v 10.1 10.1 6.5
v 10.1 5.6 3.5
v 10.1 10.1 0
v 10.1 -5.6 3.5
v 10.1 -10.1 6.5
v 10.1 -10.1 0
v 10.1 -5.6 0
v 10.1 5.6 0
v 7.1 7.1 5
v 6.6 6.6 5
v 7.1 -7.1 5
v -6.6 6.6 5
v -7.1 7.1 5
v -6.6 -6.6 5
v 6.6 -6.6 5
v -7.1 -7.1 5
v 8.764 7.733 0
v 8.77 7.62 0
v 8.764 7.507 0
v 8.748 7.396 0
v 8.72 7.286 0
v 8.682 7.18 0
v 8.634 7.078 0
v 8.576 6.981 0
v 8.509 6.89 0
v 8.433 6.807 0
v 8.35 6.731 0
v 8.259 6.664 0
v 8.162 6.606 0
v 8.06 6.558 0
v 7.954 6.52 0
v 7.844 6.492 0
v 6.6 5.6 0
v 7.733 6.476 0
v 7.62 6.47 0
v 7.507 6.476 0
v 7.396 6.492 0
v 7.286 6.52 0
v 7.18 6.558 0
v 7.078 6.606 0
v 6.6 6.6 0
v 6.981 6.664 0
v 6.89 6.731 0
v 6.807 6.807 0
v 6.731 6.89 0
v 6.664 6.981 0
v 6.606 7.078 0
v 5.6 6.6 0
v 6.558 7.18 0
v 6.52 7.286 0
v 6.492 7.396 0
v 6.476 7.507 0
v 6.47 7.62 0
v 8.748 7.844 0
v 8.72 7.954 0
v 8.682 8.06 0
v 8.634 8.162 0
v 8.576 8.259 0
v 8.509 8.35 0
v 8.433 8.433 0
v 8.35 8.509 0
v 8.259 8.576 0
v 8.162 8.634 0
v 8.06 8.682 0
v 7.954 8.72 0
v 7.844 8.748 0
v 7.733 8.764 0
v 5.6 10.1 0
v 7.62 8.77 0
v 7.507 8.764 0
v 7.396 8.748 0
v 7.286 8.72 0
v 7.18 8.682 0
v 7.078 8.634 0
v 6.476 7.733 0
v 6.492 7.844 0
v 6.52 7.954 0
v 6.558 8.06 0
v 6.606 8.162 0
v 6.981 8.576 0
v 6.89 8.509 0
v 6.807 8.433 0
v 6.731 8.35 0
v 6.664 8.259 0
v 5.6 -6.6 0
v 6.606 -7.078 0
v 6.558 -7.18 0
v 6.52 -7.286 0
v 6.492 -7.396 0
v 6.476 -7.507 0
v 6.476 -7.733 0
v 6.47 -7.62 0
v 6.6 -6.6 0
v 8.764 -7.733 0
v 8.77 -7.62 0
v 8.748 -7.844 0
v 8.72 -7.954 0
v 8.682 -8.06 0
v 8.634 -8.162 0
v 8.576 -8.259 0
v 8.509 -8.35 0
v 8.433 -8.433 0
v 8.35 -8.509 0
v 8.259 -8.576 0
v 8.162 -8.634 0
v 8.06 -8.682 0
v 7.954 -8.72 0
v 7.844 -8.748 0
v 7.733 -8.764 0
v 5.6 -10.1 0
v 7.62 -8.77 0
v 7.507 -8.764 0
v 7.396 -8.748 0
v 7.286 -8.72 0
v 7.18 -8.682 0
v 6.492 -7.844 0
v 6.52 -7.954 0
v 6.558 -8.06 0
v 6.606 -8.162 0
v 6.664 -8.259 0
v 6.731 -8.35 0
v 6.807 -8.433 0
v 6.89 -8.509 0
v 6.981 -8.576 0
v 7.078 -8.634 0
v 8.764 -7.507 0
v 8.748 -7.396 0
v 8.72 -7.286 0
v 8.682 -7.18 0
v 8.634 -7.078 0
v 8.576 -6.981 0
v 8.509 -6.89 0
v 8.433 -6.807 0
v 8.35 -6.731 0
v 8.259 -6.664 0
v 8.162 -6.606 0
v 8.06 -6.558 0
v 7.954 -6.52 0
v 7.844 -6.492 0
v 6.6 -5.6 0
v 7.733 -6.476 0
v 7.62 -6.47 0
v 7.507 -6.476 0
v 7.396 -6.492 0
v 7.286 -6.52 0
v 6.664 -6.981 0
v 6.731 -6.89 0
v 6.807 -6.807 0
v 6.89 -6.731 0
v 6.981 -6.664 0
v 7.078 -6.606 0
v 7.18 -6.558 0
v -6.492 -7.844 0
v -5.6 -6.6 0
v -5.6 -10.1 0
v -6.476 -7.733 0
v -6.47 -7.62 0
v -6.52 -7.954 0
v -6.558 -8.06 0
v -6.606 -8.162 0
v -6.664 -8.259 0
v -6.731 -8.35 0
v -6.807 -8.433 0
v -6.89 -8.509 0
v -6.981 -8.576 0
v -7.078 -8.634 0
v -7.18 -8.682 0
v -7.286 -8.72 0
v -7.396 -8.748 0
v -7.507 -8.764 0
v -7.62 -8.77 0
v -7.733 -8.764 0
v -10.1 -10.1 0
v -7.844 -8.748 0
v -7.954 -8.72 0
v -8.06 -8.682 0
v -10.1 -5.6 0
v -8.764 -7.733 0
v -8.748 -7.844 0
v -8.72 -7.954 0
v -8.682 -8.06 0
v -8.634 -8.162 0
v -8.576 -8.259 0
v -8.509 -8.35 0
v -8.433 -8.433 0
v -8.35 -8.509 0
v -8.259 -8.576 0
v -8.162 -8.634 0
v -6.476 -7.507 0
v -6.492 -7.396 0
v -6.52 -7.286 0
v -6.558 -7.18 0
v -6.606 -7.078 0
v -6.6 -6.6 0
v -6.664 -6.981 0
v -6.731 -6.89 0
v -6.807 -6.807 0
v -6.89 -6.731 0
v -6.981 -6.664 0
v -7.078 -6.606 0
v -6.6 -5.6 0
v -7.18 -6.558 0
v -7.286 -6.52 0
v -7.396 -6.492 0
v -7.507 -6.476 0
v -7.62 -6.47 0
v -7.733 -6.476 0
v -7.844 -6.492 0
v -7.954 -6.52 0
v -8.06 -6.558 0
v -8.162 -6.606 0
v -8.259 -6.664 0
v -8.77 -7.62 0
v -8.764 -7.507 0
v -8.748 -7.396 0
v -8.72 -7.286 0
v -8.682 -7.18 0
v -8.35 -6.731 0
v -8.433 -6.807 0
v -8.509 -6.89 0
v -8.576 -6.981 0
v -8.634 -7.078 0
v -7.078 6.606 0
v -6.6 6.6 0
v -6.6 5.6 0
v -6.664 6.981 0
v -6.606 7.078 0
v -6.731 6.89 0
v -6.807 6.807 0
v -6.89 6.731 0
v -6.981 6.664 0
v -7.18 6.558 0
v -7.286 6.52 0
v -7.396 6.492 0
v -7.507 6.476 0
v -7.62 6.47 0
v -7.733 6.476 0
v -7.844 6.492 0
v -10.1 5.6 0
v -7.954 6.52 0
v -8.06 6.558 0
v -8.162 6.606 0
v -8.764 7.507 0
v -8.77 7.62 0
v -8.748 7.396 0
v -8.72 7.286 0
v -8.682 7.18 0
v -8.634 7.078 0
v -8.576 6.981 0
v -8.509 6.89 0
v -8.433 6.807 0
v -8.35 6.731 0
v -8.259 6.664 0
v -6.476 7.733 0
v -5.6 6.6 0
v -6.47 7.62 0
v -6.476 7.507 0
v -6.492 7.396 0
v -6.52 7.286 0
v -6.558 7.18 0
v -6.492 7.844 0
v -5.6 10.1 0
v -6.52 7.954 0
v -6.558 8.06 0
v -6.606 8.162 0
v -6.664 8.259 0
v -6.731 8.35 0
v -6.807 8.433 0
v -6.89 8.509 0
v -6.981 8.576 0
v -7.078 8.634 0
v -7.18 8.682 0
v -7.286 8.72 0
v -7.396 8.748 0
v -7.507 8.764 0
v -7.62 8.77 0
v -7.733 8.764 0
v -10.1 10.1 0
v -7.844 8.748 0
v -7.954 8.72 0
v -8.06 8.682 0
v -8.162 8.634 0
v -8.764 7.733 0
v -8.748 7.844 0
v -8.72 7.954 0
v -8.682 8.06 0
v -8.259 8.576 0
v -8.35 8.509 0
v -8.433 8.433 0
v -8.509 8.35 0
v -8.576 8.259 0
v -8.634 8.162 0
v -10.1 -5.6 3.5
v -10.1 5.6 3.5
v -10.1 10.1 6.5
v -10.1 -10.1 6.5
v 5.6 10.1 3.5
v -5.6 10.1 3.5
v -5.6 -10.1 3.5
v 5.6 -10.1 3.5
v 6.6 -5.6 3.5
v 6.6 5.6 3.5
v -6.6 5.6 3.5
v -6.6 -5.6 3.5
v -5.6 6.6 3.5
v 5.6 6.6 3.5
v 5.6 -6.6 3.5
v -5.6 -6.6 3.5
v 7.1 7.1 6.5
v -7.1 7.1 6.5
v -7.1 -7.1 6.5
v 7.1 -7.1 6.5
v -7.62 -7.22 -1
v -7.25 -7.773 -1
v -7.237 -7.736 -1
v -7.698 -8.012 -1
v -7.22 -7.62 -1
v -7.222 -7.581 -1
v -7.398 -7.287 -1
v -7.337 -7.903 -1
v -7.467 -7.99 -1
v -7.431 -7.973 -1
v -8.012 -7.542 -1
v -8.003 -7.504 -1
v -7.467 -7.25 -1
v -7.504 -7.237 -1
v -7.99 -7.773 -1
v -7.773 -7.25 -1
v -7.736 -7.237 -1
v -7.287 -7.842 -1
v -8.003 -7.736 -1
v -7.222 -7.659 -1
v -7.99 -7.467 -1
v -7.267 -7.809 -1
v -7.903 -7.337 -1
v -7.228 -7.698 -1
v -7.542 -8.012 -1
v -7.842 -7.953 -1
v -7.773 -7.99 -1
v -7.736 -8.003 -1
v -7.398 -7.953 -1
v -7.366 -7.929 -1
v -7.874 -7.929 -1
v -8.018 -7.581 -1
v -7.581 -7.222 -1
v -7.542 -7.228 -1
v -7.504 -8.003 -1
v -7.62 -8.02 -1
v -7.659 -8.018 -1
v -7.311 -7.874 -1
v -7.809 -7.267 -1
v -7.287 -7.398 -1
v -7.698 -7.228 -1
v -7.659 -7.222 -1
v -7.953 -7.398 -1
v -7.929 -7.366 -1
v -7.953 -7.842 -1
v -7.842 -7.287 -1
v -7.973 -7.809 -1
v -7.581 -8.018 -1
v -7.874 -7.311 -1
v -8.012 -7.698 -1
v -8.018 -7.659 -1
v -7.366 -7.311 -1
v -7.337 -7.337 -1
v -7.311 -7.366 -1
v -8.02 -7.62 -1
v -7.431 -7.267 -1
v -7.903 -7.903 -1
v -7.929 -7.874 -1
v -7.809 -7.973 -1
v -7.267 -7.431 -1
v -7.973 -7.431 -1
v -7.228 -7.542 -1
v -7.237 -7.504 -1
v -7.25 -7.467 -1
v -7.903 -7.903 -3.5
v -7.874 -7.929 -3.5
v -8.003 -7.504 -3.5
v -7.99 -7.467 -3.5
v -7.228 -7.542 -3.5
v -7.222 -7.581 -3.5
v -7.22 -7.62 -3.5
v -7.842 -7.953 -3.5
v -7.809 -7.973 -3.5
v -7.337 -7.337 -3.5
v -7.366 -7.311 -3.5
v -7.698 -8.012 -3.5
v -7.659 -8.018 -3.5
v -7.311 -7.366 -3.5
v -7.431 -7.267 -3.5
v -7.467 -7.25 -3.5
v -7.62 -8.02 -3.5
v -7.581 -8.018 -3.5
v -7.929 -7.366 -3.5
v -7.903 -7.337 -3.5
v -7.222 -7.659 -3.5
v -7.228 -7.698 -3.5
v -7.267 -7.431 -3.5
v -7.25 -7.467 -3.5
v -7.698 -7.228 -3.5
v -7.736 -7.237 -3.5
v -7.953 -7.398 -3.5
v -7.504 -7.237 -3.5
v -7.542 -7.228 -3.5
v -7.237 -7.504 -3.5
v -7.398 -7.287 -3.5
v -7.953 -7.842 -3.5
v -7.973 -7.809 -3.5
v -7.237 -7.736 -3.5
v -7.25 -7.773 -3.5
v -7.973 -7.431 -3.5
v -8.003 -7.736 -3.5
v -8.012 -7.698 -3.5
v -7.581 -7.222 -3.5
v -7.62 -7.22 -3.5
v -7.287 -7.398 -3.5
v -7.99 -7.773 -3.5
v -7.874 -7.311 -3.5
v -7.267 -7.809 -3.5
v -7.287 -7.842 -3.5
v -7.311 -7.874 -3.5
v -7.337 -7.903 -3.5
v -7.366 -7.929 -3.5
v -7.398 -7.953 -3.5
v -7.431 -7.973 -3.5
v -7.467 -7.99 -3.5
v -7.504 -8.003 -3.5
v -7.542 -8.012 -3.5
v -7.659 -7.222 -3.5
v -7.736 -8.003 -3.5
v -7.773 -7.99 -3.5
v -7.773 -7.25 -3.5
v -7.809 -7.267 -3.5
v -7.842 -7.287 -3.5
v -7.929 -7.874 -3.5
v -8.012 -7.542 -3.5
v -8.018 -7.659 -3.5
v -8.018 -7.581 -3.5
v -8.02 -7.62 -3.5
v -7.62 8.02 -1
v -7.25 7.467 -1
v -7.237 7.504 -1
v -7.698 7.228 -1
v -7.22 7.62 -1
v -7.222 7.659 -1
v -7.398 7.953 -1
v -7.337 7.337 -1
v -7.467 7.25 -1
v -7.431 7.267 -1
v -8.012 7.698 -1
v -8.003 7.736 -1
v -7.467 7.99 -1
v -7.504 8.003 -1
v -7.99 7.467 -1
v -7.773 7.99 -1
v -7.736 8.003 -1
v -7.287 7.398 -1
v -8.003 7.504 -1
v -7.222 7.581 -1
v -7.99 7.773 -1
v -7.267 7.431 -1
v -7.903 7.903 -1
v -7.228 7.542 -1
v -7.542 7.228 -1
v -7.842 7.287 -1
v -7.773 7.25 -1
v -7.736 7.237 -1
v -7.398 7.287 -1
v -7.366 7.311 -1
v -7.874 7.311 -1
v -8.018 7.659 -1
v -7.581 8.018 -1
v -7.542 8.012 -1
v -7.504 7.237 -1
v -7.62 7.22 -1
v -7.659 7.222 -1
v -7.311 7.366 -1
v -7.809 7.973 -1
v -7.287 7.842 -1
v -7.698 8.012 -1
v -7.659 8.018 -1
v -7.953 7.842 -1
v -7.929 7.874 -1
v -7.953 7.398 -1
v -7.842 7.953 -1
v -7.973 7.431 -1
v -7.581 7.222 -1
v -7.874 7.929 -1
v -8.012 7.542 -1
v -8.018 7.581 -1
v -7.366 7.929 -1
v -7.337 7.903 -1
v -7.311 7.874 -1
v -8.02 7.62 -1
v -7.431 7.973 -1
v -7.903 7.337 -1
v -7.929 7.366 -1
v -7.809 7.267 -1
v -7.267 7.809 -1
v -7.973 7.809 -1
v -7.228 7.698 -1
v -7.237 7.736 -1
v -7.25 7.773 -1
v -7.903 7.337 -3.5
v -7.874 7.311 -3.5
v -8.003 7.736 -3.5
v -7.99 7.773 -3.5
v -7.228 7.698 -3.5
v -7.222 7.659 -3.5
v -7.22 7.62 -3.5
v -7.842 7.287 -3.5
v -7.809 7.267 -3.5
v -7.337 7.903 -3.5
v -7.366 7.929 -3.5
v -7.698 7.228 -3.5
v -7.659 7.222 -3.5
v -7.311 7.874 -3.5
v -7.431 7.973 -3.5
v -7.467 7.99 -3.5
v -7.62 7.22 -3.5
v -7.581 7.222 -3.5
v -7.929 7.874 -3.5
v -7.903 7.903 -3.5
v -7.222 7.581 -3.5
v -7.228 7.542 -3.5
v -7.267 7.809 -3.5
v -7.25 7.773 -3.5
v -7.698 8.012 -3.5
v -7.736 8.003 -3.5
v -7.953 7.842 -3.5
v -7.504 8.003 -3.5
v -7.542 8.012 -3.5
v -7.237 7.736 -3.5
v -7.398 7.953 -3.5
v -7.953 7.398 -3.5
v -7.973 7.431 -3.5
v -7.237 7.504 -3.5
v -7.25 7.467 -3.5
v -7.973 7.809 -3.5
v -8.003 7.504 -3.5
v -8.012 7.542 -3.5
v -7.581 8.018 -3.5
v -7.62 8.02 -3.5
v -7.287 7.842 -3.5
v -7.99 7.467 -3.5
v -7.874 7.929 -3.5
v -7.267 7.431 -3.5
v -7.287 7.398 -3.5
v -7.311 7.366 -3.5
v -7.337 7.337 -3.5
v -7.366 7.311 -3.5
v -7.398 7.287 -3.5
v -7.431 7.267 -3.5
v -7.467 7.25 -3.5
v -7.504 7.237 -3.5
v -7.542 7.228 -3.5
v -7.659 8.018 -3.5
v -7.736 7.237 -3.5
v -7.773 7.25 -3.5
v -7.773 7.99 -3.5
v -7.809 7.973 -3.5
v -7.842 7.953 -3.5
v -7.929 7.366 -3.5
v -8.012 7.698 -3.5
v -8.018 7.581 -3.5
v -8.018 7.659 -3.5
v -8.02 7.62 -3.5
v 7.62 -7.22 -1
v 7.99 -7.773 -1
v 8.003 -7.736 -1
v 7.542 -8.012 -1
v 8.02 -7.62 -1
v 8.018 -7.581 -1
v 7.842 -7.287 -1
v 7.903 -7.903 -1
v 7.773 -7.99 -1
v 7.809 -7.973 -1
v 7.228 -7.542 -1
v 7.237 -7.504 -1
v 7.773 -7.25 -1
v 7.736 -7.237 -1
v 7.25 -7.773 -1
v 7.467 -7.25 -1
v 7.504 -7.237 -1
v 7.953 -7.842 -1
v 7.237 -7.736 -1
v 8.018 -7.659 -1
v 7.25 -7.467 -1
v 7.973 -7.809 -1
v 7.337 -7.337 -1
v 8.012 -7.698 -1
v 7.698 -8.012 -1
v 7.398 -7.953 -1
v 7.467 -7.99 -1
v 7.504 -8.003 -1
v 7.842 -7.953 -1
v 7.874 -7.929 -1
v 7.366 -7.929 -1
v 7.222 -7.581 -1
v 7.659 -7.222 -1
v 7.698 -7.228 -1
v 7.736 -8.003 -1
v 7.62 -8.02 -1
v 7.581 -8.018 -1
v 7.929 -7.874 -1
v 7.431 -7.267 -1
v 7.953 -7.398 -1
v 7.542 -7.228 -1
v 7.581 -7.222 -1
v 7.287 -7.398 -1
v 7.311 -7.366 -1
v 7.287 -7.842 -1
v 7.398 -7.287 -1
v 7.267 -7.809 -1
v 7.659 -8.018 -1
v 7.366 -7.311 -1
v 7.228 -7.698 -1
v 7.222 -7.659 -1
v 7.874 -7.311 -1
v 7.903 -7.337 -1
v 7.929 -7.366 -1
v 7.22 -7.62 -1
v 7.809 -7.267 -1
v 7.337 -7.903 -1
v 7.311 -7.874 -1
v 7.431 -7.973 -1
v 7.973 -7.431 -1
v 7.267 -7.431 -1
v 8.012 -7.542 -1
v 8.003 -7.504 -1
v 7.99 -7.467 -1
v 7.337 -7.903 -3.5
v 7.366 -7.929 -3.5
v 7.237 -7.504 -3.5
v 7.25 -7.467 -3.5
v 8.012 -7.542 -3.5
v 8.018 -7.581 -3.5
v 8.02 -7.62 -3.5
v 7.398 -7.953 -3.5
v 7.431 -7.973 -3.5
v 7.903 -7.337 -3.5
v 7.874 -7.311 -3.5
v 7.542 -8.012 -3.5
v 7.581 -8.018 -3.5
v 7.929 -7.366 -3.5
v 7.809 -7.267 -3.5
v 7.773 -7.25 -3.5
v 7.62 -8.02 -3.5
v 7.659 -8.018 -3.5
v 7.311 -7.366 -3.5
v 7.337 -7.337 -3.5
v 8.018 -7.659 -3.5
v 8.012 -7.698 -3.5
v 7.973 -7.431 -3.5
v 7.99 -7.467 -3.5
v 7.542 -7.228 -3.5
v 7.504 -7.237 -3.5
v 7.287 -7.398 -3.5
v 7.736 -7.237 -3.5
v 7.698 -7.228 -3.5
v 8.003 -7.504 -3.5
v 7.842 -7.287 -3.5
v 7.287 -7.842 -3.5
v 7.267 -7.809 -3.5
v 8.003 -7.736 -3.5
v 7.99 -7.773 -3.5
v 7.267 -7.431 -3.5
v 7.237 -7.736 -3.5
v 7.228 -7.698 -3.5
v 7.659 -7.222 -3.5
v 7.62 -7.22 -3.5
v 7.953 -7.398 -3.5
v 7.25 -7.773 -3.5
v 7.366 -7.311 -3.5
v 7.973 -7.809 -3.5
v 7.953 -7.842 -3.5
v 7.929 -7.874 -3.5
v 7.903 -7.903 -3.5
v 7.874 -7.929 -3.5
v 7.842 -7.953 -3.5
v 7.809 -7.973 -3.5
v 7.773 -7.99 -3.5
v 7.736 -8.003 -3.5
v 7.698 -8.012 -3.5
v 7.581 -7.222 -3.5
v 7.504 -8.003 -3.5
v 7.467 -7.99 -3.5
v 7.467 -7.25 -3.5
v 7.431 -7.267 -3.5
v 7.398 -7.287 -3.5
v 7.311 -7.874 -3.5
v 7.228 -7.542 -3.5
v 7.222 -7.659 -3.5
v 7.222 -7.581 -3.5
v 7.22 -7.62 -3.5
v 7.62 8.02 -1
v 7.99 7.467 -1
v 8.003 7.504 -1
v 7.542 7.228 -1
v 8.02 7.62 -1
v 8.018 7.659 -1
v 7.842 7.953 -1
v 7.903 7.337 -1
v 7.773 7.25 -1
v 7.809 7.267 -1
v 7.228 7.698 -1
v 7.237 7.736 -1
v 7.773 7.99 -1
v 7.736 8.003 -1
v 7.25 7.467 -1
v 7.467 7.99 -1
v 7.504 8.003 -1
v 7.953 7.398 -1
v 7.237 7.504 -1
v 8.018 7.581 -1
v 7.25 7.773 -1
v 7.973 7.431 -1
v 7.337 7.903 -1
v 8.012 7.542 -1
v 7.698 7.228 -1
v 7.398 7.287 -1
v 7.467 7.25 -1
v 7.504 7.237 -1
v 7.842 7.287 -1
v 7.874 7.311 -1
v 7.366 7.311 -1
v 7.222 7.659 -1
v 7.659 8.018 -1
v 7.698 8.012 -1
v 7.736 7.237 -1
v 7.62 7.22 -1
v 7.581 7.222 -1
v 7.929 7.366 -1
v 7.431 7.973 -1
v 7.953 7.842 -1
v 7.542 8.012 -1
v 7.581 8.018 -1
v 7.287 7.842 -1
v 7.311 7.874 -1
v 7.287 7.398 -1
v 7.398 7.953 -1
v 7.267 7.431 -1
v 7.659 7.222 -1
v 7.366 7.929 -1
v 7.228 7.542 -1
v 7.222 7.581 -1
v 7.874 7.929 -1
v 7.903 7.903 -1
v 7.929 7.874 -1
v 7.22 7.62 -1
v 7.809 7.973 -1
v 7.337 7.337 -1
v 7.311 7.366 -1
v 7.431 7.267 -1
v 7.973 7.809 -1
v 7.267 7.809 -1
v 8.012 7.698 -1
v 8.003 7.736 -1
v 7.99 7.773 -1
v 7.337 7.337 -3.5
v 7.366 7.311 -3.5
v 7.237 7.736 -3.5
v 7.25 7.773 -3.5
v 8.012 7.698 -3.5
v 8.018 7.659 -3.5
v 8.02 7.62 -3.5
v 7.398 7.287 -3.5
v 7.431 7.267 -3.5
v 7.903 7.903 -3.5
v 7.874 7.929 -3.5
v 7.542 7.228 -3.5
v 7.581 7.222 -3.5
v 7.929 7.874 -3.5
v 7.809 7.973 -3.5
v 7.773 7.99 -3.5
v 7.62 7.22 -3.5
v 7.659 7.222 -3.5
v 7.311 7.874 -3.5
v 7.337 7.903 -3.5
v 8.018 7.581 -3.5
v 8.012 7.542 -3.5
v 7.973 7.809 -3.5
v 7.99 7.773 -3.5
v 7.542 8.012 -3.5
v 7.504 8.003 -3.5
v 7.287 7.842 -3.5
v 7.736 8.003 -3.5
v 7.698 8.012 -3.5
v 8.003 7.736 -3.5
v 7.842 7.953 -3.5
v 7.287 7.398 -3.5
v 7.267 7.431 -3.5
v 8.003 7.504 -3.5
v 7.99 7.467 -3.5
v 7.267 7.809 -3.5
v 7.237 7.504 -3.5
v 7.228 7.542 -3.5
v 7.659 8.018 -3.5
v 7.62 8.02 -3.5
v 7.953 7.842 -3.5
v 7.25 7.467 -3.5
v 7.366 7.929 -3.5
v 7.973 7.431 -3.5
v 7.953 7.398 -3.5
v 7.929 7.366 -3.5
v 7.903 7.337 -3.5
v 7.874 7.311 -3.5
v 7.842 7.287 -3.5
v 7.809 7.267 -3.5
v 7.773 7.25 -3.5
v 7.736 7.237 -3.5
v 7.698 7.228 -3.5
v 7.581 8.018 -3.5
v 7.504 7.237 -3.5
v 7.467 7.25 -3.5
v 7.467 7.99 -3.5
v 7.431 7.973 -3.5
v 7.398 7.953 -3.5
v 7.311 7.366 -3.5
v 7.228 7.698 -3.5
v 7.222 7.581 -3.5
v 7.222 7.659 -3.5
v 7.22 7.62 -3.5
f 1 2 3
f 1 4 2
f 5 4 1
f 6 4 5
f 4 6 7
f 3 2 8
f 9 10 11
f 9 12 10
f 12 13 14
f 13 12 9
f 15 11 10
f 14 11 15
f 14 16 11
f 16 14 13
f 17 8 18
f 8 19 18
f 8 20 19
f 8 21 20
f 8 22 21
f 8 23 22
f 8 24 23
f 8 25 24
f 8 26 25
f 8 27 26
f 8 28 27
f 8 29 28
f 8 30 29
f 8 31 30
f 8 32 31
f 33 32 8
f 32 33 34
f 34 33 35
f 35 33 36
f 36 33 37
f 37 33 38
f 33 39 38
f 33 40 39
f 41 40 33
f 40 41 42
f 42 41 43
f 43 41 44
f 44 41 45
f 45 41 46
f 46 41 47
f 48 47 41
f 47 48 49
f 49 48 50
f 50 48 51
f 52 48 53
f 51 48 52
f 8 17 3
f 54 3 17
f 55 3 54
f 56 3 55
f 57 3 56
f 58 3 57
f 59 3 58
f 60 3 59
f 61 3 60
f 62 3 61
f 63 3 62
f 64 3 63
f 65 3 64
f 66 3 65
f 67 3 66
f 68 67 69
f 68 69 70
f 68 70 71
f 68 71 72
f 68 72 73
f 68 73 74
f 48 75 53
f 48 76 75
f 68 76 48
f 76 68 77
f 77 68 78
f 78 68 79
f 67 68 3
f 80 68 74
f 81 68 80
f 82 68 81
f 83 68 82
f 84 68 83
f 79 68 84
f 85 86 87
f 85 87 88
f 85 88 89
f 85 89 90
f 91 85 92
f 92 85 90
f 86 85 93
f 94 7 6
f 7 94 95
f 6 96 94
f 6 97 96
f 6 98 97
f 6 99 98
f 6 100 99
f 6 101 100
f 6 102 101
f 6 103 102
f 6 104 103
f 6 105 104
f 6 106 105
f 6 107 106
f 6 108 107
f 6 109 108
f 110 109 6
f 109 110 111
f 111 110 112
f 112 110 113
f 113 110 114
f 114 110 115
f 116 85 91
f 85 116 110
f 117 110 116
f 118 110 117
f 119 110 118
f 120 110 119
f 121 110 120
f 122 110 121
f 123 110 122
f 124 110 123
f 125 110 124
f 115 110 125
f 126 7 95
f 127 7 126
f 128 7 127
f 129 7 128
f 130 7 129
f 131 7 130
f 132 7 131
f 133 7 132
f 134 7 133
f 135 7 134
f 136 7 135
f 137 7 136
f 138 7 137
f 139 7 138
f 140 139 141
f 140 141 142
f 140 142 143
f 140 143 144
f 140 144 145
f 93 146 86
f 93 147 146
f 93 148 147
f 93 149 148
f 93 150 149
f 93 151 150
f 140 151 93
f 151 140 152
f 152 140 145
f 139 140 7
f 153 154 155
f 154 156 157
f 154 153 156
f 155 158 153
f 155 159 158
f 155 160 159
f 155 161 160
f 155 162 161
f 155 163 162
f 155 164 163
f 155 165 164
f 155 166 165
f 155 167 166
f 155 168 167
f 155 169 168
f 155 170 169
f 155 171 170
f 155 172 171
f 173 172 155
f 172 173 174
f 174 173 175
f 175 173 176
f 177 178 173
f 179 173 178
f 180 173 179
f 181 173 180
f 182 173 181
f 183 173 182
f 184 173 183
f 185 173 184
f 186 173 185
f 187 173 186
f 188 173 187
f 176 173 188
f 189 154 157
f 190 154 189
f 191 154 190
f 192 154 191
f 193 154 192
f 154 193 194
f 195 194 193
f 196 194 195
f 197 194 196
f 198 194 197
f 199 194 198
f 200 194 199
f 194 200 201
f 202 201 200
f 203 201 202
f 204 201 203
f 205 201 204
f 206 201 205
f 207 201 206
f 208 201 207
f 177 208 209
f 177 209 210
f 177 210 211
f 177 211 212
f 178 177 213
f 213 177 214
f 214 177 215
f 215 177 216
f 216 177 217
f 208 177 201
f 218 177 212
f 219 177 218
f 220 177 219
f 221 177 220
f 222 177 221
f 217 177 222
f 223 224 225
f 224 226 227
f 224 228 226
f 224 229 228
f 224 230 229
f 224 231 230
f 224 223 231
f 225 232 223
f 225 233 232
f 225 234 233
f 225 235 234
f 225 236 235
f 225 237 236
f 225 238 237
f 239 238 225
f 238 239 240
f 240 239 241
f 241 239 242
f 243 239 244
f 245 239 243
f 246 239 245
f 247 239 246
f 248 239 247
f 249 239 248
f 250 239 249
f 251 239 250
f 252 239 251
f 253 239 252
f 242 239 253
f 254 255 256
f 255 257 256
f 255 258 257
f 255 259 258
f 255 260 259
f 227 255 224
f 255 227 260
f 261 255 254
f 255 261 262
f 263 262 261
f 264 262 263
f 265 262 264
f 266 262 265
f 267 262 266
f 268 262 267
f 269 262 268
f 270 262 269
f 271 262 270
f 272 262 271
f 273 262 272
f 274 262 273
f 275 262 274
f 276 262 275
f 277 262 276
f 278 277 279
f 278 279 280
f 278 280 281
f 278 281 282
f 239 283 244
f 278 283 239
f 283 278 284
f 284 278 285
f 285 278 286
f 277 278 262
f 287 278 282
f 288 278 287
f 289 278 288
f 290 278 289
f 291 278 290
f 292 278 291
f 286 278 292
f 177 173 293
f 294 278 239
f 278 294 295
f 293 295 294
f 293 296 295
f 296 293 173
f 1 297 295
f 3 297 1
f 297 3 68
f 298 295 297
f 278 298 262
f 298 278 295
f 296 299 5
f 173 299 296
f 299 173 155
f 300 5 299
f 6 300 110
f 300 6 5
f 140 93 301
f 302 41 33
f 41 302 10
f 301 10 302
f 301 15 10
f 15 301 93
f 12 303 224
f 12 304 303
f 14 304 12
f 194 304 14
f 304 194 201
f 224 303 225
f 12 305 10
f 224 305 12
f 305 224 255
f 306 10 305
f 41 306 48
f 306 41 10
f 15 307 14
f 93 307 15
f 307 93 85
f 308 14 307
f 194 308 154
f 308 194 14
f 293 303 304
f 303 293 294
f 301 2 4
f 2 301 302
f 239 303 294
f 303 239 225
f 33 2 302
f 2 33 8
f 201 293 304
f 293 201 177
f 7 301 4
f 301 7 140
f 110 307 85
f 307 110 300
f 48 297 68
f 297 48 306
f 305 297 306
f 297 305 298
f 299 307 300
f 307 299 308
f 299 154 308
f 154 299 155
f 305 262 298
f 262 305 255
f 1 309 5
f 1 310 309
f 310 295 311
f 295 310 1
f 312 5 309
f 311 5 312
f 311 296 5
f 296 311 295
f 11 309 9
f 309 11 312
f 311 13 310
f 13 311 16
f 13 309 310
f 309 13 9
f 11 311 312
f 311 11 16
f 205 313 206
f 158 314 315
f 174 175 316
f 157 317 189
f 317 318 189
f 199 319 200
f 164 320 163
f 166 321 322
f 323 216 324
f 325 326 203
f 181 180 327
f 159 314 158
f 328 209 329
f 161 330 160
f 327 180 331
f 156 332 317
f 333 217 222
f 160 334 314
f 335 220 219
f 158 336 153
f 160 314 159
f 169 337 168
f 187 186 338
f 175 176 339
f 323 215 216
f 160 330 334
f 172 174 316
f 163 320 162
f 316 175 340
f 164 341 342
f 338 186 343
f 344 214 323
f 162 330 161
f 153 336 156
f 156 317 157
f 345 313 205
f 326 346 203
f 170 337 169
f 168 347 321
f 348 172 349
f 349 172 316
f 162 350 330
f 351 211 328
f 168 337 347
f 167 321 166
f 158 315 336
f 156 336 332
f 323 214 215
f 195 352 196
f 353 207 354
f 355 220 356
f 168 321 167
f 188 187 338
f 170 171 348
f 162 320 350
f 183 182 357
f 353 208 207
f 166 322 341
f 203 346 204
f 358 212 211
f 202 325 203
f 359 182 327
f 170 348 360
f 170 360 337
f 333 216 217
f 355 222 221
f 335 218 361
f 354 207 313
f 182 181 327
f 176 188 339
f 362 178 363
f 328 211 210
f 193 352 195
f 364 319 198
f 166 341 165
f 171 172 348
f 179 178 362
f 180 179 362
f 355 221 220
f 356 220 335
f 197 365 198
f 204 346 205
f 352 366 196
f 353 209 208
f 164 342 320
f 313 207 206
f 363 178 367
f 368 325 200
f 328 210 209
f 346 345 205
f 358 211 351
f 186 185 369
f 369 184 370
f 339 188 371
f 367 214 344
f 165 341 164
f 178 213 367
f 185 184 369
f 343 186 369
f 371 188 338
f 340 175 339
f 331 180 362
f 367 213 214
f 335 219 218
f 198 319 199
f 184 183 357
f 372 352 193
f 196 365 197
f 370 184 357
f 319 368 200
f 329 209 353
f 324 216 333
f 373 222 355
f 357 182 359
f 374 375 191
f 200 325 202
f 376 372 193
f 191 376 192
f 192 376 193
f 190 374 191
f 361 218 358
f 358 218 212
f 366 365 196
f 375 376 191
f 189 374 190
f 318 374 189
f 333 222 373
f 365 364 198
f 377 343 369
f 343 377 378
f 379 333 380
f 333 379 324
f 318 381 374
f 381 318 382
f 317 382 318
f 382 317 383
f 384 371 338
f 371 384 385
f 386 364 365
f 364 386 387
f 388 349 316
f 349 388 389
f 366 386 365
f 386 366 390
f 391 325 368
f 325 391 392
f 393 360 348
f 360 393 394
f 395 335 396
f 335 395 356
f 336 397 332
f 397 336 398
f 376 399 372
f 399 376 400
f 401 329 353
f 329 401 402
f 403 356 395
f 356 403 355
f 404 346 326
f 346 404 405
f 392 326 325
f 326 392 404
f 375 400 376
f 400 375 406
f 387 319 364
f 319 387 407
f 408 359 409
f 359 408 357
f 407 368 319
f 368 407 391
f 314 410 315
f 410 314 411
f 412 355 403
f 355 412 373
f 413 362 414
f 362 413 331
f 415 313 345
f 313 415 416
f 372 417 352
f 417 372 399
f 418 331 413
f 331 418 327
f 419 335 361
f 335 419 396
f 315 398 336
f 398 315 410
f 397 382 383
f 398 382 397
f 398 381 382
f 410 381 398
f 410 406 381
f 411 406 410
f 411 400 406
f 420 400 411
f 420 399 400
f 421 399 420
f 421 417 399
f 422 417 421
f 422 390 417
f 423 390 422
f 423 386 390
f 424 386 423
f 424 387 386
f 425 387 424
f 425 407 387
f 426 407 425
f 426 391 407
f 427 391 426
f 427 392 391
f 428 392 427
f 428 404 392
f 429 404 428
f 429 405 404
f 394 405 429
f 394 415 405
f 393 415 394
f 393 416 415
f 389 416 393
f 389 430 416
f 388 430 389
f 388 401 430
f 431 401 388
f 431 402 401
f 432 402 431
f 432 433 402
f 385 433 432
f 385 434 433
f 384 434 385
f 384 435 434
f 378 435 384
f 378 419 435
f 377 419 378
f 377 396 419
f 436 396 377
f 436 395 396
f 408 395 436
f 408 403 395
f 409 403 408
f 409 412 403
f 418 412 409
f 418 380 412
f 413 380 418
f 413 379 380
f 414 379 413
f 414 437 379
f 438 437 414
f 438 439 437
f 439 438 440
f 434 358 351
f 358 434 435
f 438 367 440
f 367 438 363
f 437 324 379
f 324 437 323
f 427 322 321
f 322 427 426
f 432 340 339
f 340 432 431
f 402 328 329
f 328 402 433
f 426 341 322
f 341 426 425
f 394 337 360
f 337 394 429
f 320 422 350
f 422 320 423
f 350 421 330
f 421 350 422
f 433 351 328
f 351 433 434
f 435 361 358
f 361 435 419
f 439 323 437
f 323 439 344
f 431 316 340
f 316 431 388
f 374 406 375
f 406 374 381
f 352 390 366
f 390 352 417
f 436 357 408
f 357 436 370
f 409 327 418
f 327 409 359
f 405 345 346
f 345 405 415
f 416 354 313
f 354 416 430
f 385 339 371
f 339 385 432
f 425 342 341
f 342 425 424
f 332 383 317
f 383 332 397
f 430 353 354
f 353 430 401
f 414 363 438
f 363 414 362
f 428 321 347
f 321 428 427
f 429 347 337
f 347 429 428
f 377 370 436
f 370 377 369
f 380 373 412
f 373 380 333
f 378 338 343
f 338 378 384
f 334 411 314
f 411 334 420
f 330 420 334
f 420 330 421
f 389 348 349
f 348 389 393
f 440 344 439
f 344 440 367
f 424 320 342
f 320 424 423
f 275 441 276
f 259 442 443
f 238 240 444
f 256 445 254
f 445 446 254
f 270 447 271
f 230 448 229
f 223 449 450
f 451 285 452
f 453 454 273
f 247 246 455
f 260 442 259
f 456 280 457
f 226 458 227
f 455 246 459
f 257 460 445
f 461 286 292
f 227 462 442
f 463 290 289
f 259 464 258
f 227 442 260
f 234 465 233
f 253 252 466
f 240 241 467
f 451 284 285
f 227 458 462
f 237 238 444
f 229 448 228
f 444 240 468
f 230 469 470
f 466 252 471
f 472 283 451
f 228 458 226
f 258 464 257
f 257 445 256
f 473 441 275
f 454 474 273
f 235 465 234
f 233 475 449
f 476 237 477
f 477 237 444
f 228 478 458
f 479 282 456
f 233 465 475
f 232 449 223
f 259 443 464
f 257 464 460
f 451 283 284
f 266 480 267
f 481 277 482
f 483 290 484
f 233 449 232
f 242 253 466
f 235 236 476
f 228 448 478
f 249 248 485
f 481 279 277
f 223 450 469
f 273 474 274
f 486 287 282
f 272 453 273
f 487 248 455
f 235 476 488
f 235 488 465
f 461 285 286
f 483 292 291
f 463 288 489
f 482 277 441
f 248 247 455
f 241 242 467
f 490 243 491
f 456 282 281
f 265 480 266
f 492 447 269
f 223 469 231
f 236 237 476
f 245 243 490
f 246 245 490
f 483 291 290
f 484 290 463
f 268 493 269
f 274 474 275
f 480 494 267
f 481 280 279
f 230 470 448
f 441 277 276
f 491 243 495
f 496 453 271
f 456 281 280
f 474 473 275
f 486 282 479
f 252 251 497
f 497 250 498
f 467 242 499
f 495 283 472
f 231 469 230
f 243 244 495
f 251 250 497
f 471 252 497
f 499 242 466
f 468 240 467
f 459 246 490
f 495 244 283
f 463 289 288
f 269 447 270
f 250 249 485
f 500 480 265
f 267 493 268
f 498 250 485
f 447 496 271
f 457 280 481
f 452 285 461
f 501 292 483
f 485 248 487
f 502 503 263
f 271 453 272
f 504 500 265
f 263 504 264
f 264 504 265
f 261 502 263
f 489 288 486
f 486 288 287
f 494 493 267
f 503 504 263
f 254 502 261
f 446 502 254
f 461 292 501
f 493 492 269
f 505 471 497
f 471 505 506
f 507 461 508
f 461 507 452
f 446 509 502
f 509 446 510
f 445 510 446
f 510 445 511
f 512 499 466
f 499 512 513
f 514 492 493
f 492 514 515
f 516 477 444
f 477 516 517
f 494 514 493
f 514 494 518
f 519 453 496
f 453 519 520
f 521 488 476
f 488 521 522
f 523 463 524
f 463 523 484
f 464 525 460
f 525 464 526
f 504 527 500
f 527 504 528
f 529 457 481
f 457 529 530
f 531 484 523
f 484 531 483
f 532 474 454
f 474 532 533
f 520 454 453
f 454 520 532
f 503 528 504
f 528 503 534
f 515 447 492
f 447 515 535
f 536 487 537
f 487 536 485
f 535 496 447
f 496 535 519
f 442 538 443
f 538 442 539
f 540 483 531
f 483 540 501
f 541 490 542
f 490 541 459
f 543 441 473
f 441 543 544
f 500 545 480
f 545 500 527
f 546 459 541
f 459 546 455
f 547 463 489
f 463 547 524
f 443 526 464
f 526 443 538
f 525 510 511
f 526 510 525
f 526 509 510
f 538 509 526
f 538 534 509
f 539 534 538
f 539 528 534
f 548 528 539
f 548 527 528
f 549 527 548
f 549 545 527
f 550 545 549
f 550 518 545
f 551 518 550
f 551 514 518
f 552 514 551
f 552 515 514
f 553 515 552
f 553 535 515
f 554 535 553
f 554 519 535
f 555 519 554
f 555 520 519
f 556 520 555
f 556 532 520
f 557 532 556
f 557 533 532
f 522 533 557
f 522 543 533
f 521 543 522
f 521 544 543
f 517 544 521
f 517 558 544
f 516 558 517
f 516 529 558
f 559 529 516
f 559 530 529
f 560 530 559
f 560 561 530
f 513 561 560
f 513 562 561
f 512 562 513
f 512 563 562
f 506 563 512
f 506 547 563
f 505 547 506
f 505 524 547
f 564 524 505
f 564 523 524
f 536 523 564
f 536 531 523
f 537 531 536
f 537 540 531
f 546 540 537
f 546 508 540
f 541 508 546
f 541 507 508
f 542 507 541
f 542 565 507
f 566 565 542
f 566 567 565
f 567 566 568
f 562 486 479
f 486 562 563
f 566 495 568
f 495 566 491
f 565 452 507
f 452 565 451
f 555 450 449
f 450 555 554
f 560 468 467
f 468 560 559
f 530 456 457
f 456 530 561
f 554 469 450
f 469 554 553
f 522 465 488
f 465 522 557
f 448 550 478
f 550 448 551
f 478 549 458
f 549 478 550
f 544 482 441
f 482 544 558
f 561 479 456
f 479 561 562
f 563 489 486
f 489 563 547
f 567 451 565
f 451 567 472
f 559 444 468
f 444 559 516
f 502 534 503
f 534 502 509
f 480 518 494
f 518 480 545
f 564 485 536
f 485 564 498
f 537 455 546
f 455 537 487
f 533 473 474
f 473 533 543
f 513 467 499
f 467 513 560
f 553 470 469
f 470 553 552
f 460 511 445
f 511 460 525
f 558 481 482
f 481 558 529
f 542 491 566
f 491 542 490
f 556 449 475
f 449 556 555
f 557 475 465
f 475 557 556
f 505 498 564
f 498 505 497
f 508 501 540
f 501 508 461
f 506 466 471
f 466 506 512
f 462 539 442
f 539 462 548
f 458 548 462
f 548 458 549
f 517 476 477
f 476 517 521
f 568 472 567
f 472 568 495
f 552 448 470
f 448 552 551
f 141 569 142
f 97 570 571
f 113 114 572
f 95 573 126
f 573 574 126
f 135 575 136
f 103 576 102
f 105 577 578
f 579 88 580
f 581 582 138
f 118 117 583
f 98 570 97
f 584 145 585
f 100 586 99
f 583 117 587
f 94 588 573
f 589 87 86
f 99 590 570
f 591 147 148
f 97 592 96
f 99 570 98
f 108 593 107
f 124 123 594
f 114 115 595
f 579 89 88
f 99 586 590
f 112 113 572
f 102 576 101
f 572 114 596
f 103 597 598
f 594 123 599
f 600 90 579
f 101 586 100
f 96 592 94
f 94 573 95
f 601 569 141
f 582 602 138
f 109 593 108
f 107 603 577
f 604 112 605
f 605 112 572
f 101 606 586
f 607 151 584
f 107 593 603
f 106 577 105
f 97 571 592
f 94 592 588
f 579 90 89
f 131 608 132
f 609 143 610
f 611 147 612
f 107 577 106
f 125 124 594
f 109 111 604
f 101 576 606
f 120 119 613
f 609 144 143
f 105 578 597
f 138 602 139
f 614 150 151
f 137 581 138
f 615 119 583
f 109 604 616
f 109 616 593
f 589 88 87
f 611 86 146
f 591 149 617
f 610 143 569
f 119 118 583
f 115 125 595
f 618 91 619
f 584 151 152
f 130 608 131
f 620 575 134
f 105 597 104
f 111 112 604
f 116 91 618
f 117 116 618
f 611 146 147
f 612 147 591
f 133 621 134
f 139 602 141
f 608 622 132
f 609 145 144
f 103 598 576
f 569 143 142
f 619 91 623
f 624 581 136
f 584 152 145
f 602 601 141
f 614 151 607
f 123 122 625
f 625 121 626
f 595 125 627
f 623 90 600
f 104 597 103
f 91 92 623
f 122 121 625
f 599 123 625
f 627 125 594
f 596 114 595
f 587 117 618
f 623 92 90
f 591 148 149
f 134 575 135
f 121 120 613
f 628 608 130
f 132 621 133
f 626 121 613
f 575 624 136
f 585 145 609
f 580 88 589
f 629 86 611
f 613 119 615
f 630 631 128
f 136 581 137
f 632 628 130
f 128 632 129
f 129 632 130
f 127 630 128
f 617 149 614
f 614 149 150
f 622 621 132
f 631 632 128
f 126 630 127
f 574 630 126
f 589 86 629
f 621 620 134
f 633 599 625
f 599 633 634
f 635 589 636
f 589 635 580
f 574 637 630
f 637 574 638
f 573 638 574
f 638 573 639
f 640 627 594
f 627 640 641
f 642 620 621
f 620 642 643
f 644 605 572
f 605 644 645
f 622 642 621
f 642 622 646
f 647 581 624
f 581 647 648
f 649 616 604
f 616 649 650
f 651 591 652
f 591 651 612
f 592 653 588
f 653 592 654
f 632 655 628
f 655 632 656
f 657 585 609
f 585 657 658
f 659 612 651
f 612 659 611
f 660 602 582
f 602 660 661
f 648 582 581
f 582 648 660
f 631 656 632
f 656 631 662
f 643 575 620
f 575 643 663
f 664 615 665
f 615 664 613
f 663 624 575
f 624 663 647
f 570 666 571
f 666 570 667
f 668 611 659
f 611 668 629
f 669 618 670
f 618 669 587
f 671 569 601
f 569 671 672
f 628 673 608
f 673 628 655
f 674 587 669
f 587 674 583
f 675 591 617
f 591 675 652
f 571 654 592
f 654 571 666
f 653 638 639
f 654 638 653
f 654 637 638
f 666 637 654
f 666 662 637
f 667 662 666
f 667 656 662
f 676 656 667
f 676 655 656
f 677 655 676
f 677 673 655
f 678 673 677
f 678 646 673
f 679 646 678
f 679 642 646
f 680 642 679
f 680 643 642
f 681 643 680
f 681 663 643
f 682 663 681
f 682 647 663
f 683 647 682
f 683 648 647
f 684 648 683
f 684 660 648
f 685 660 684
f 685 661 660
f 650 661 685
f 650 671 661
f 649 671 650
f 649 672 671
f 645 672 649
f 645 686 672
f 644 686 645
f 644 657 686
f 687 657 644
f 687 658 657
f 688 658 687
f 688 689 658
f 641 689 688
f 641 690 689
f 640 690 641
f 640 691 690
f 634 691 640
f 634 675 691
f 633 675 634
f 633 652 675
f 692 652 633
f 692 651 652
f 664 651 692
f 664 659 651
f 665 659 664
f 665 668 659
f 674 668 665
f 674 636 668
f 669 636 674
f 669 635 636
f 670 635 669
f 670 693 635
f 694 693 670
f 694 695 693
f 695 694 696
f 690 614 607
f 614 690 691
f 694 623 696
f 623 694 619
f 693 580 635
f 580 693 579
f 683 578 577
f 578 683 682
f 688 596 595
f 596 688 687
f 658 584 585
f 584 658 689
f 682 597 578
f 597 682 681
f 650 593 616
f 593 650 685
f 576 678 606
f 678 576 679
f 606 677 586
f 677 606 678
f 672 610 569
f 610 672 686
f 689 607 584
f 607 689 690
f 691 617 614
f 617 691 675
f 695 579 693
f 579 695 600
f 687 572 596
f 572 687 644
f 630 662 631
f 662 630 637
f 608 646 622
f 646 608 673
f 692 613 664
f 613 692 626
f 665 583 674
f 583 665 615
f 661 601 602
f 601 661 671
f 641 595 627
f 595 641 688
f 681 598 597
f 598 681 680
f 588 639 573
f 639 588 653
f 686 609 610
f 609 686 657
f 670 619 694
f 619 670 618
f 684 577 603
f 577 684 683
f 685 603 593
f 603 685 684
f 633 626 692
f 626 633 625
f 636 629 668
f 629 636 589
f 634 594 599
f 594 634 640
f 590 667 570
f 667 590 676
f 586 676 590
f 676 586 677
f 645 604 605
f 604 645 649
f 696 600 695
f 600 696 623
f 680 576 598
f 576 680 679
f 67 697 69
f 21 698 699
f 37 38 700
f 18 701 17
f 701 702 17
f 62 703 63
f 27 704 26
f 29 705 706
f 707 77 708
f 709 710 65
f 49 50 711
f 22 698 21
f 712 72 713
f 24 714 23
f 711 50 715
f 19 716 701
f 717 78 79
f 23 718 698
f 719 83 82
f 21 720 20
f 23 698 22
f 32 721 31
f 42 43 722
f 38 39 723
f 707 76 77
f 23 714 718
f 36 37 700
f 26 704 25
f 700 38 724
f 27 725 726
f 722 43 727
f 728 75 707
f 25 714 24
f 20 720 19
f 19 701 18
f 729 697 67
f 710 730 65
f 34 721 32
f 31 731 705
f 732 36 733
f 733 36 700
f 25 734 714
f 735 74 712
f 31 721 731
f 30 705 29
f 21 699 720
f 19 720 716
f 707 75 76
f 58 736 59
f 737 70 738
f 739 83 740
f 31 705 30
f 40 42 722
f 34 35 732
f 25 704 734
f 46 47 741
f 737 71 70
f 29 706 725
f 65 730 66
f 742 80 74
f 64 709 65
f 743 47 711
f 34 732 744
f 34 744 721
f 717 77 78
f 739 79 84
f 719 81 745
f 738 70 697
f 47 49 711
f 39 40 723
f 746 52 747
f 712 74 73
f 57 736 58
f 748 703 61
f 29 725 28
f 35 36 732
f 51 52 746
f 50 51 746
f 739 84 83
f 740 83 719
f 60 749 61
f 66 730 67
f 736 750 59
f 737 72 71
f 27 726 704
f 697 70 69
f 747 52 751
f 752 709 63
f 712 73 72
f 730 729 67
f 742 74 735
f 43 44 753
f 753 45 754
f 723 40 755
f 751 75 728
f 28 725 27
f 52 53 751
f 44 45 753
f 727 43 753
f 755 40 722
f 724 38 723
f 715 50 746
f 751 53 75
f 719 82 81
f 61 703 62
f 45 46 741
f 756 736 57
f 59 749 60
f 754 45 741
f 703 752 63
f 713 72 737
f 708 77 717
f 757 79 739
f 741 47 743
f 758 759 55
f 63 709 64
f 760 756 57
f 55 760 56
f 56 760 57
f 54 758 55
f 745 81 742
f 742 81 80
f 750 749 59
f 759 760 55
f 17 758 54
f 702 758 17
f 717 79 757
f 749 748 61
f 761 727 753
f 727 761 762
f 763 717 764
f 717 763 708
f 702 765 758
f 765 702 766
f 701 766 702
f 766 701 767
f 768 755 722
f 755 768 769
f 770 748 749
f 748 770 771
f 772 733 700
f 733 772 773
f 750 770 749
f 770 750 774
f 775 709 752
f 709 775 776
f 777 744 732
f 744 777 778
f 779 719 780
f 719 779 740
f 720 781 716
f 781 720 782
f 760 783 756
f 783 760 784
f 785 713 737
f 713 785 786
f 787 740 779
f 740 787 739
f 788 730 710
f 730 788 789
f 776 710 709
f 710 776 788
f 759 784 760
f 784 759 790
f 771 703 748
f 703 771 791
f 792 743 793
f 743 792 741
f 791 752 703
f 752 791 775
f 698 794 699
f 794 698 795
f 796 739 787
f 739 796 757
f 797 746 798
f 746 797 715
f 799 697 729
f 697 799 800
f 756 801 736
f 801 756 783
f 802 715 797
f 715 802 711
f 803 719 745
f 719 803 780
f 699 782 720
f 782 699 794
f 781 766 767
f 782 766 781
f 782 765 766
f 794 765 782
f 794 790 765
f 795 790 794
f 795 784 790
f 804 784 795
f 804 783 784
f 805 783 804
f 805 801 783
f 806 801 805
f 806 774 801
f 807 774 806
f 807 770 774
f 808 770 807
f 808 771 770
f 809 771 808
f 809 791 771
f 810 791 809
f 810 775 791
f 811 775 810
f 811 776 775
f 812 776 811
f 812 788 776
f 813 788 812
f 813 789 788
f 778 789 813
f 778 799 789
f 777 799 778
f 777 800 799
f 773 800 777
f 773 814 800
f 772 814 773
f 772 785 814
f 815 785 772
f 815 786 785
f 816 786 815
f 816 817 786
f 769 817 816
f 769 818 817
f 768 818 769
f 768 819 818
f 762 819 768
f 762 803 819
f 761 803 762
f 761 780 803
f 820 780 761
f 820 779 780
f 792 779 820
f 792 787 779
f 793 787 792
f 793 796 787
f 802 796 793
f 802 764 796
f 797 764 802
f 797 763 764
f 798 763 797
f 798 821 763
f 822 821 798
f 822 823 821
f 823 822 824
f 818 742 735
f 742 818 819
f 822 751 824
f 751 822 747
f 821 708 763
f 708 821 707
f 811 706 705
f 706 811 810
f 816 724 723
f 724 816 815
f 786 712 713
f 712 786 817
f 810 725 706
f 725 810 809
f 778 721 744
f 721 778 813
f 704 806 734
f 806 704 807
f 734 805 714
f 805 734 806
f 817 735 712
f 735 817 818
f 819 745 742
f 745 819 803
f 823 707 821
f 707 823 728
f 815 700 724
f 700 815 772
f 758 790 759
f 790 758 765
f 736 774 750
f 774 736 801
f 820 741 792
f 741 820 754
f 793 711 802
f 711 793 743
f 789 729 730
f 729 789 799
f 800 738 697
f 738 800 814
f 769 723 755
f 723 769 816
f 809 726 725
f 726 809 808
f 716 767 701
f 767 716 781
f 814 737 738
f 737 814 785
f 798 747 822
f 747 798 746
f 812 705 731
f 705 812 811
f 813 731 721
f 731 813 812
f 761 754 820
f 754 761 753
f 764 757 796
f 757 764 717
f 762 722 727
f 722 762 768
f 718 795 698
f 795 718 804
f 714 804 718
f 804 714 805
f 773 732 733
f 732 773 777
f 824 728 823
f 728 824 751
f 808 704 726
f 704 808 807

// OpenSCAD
// --- User Settings ---
switch_width = 14.2;      // Square hole for the switch body
leg_height = 5.0;         // Clearance for the Hall Effect sensor
wall_thickness = 3.0;     // Thickness of the bridge legs
pin_diameter = 0.8;       // Fit for breadboard holes
pin_length = 3.5;         // Total depth of the peg
fillet_height = 1.;      // How far the reinforcement extends down the peg

/* [Calculated Dimensions] */
grid = 2.54;
outer_size = switch_width + (wall_thickness * 2);
// Align pins to the nearest 2.54mm breadboard hole
pin_offset = round((outer_size / 2 - 1.5) / grid) * grid;

$fn = 64;

module breadboard_bridge() {
    union() {
        // 1. The Main Frame (The Garage)
        difference() {
            translate([0, 0, leg_height / 2])
                cube([outer_size, outer_size, leg_height], center = true);
            
            // Hollow center for the sensor
            translate([0, 0, leg_height / 2])
                cube([switch_width - 1, switch_width - 1, leg_height + 1], center = true);
            
            // Side arches for wire access
                cube([outer_size + 2, switch_width - 3, leg_height + 2], center = true);
                cube([switch_width - 3, outer_size + 2, leg_height + 2], center = true);
        }

        // 2. The Mounting Plate (1.5mm standard)
        translate([0, 0, leg_height + 0.75])
            difference() {
                cube([outer_size, outer_size, 1.5], center = true);
                cube([switch_width, switch_width, 2], center = true);
            }

        // 3. Properly Reinforced Pins
        for (x = [-pin_offset, pin_offset]) {
            for (y = [-pin_offset, pin_offset]) {
                translate([x, y, 0]) {
                    // CONICAL FILLET
                    // This starts at the base and tapers down into the pin
                    // We use negative Z to ensure it goes DOWN from the base
                    translate([0, 0, -fillet_height])
                        cylinder(d1 = pin_diameter, d2 = pin_diameter + (fillet_height * 1.5), h = fillet_height); 
                    
                    // THE MAIN PEG
                    // Starts from the end of the fillet to reach total pin_length
                    translate([0, 0, -pin_length])
                        cylinder(d = pin_diameter, h = pin_length - fillet_height + 0.1);
                }
            }
        }
    }
}

breadboard_bridge();
